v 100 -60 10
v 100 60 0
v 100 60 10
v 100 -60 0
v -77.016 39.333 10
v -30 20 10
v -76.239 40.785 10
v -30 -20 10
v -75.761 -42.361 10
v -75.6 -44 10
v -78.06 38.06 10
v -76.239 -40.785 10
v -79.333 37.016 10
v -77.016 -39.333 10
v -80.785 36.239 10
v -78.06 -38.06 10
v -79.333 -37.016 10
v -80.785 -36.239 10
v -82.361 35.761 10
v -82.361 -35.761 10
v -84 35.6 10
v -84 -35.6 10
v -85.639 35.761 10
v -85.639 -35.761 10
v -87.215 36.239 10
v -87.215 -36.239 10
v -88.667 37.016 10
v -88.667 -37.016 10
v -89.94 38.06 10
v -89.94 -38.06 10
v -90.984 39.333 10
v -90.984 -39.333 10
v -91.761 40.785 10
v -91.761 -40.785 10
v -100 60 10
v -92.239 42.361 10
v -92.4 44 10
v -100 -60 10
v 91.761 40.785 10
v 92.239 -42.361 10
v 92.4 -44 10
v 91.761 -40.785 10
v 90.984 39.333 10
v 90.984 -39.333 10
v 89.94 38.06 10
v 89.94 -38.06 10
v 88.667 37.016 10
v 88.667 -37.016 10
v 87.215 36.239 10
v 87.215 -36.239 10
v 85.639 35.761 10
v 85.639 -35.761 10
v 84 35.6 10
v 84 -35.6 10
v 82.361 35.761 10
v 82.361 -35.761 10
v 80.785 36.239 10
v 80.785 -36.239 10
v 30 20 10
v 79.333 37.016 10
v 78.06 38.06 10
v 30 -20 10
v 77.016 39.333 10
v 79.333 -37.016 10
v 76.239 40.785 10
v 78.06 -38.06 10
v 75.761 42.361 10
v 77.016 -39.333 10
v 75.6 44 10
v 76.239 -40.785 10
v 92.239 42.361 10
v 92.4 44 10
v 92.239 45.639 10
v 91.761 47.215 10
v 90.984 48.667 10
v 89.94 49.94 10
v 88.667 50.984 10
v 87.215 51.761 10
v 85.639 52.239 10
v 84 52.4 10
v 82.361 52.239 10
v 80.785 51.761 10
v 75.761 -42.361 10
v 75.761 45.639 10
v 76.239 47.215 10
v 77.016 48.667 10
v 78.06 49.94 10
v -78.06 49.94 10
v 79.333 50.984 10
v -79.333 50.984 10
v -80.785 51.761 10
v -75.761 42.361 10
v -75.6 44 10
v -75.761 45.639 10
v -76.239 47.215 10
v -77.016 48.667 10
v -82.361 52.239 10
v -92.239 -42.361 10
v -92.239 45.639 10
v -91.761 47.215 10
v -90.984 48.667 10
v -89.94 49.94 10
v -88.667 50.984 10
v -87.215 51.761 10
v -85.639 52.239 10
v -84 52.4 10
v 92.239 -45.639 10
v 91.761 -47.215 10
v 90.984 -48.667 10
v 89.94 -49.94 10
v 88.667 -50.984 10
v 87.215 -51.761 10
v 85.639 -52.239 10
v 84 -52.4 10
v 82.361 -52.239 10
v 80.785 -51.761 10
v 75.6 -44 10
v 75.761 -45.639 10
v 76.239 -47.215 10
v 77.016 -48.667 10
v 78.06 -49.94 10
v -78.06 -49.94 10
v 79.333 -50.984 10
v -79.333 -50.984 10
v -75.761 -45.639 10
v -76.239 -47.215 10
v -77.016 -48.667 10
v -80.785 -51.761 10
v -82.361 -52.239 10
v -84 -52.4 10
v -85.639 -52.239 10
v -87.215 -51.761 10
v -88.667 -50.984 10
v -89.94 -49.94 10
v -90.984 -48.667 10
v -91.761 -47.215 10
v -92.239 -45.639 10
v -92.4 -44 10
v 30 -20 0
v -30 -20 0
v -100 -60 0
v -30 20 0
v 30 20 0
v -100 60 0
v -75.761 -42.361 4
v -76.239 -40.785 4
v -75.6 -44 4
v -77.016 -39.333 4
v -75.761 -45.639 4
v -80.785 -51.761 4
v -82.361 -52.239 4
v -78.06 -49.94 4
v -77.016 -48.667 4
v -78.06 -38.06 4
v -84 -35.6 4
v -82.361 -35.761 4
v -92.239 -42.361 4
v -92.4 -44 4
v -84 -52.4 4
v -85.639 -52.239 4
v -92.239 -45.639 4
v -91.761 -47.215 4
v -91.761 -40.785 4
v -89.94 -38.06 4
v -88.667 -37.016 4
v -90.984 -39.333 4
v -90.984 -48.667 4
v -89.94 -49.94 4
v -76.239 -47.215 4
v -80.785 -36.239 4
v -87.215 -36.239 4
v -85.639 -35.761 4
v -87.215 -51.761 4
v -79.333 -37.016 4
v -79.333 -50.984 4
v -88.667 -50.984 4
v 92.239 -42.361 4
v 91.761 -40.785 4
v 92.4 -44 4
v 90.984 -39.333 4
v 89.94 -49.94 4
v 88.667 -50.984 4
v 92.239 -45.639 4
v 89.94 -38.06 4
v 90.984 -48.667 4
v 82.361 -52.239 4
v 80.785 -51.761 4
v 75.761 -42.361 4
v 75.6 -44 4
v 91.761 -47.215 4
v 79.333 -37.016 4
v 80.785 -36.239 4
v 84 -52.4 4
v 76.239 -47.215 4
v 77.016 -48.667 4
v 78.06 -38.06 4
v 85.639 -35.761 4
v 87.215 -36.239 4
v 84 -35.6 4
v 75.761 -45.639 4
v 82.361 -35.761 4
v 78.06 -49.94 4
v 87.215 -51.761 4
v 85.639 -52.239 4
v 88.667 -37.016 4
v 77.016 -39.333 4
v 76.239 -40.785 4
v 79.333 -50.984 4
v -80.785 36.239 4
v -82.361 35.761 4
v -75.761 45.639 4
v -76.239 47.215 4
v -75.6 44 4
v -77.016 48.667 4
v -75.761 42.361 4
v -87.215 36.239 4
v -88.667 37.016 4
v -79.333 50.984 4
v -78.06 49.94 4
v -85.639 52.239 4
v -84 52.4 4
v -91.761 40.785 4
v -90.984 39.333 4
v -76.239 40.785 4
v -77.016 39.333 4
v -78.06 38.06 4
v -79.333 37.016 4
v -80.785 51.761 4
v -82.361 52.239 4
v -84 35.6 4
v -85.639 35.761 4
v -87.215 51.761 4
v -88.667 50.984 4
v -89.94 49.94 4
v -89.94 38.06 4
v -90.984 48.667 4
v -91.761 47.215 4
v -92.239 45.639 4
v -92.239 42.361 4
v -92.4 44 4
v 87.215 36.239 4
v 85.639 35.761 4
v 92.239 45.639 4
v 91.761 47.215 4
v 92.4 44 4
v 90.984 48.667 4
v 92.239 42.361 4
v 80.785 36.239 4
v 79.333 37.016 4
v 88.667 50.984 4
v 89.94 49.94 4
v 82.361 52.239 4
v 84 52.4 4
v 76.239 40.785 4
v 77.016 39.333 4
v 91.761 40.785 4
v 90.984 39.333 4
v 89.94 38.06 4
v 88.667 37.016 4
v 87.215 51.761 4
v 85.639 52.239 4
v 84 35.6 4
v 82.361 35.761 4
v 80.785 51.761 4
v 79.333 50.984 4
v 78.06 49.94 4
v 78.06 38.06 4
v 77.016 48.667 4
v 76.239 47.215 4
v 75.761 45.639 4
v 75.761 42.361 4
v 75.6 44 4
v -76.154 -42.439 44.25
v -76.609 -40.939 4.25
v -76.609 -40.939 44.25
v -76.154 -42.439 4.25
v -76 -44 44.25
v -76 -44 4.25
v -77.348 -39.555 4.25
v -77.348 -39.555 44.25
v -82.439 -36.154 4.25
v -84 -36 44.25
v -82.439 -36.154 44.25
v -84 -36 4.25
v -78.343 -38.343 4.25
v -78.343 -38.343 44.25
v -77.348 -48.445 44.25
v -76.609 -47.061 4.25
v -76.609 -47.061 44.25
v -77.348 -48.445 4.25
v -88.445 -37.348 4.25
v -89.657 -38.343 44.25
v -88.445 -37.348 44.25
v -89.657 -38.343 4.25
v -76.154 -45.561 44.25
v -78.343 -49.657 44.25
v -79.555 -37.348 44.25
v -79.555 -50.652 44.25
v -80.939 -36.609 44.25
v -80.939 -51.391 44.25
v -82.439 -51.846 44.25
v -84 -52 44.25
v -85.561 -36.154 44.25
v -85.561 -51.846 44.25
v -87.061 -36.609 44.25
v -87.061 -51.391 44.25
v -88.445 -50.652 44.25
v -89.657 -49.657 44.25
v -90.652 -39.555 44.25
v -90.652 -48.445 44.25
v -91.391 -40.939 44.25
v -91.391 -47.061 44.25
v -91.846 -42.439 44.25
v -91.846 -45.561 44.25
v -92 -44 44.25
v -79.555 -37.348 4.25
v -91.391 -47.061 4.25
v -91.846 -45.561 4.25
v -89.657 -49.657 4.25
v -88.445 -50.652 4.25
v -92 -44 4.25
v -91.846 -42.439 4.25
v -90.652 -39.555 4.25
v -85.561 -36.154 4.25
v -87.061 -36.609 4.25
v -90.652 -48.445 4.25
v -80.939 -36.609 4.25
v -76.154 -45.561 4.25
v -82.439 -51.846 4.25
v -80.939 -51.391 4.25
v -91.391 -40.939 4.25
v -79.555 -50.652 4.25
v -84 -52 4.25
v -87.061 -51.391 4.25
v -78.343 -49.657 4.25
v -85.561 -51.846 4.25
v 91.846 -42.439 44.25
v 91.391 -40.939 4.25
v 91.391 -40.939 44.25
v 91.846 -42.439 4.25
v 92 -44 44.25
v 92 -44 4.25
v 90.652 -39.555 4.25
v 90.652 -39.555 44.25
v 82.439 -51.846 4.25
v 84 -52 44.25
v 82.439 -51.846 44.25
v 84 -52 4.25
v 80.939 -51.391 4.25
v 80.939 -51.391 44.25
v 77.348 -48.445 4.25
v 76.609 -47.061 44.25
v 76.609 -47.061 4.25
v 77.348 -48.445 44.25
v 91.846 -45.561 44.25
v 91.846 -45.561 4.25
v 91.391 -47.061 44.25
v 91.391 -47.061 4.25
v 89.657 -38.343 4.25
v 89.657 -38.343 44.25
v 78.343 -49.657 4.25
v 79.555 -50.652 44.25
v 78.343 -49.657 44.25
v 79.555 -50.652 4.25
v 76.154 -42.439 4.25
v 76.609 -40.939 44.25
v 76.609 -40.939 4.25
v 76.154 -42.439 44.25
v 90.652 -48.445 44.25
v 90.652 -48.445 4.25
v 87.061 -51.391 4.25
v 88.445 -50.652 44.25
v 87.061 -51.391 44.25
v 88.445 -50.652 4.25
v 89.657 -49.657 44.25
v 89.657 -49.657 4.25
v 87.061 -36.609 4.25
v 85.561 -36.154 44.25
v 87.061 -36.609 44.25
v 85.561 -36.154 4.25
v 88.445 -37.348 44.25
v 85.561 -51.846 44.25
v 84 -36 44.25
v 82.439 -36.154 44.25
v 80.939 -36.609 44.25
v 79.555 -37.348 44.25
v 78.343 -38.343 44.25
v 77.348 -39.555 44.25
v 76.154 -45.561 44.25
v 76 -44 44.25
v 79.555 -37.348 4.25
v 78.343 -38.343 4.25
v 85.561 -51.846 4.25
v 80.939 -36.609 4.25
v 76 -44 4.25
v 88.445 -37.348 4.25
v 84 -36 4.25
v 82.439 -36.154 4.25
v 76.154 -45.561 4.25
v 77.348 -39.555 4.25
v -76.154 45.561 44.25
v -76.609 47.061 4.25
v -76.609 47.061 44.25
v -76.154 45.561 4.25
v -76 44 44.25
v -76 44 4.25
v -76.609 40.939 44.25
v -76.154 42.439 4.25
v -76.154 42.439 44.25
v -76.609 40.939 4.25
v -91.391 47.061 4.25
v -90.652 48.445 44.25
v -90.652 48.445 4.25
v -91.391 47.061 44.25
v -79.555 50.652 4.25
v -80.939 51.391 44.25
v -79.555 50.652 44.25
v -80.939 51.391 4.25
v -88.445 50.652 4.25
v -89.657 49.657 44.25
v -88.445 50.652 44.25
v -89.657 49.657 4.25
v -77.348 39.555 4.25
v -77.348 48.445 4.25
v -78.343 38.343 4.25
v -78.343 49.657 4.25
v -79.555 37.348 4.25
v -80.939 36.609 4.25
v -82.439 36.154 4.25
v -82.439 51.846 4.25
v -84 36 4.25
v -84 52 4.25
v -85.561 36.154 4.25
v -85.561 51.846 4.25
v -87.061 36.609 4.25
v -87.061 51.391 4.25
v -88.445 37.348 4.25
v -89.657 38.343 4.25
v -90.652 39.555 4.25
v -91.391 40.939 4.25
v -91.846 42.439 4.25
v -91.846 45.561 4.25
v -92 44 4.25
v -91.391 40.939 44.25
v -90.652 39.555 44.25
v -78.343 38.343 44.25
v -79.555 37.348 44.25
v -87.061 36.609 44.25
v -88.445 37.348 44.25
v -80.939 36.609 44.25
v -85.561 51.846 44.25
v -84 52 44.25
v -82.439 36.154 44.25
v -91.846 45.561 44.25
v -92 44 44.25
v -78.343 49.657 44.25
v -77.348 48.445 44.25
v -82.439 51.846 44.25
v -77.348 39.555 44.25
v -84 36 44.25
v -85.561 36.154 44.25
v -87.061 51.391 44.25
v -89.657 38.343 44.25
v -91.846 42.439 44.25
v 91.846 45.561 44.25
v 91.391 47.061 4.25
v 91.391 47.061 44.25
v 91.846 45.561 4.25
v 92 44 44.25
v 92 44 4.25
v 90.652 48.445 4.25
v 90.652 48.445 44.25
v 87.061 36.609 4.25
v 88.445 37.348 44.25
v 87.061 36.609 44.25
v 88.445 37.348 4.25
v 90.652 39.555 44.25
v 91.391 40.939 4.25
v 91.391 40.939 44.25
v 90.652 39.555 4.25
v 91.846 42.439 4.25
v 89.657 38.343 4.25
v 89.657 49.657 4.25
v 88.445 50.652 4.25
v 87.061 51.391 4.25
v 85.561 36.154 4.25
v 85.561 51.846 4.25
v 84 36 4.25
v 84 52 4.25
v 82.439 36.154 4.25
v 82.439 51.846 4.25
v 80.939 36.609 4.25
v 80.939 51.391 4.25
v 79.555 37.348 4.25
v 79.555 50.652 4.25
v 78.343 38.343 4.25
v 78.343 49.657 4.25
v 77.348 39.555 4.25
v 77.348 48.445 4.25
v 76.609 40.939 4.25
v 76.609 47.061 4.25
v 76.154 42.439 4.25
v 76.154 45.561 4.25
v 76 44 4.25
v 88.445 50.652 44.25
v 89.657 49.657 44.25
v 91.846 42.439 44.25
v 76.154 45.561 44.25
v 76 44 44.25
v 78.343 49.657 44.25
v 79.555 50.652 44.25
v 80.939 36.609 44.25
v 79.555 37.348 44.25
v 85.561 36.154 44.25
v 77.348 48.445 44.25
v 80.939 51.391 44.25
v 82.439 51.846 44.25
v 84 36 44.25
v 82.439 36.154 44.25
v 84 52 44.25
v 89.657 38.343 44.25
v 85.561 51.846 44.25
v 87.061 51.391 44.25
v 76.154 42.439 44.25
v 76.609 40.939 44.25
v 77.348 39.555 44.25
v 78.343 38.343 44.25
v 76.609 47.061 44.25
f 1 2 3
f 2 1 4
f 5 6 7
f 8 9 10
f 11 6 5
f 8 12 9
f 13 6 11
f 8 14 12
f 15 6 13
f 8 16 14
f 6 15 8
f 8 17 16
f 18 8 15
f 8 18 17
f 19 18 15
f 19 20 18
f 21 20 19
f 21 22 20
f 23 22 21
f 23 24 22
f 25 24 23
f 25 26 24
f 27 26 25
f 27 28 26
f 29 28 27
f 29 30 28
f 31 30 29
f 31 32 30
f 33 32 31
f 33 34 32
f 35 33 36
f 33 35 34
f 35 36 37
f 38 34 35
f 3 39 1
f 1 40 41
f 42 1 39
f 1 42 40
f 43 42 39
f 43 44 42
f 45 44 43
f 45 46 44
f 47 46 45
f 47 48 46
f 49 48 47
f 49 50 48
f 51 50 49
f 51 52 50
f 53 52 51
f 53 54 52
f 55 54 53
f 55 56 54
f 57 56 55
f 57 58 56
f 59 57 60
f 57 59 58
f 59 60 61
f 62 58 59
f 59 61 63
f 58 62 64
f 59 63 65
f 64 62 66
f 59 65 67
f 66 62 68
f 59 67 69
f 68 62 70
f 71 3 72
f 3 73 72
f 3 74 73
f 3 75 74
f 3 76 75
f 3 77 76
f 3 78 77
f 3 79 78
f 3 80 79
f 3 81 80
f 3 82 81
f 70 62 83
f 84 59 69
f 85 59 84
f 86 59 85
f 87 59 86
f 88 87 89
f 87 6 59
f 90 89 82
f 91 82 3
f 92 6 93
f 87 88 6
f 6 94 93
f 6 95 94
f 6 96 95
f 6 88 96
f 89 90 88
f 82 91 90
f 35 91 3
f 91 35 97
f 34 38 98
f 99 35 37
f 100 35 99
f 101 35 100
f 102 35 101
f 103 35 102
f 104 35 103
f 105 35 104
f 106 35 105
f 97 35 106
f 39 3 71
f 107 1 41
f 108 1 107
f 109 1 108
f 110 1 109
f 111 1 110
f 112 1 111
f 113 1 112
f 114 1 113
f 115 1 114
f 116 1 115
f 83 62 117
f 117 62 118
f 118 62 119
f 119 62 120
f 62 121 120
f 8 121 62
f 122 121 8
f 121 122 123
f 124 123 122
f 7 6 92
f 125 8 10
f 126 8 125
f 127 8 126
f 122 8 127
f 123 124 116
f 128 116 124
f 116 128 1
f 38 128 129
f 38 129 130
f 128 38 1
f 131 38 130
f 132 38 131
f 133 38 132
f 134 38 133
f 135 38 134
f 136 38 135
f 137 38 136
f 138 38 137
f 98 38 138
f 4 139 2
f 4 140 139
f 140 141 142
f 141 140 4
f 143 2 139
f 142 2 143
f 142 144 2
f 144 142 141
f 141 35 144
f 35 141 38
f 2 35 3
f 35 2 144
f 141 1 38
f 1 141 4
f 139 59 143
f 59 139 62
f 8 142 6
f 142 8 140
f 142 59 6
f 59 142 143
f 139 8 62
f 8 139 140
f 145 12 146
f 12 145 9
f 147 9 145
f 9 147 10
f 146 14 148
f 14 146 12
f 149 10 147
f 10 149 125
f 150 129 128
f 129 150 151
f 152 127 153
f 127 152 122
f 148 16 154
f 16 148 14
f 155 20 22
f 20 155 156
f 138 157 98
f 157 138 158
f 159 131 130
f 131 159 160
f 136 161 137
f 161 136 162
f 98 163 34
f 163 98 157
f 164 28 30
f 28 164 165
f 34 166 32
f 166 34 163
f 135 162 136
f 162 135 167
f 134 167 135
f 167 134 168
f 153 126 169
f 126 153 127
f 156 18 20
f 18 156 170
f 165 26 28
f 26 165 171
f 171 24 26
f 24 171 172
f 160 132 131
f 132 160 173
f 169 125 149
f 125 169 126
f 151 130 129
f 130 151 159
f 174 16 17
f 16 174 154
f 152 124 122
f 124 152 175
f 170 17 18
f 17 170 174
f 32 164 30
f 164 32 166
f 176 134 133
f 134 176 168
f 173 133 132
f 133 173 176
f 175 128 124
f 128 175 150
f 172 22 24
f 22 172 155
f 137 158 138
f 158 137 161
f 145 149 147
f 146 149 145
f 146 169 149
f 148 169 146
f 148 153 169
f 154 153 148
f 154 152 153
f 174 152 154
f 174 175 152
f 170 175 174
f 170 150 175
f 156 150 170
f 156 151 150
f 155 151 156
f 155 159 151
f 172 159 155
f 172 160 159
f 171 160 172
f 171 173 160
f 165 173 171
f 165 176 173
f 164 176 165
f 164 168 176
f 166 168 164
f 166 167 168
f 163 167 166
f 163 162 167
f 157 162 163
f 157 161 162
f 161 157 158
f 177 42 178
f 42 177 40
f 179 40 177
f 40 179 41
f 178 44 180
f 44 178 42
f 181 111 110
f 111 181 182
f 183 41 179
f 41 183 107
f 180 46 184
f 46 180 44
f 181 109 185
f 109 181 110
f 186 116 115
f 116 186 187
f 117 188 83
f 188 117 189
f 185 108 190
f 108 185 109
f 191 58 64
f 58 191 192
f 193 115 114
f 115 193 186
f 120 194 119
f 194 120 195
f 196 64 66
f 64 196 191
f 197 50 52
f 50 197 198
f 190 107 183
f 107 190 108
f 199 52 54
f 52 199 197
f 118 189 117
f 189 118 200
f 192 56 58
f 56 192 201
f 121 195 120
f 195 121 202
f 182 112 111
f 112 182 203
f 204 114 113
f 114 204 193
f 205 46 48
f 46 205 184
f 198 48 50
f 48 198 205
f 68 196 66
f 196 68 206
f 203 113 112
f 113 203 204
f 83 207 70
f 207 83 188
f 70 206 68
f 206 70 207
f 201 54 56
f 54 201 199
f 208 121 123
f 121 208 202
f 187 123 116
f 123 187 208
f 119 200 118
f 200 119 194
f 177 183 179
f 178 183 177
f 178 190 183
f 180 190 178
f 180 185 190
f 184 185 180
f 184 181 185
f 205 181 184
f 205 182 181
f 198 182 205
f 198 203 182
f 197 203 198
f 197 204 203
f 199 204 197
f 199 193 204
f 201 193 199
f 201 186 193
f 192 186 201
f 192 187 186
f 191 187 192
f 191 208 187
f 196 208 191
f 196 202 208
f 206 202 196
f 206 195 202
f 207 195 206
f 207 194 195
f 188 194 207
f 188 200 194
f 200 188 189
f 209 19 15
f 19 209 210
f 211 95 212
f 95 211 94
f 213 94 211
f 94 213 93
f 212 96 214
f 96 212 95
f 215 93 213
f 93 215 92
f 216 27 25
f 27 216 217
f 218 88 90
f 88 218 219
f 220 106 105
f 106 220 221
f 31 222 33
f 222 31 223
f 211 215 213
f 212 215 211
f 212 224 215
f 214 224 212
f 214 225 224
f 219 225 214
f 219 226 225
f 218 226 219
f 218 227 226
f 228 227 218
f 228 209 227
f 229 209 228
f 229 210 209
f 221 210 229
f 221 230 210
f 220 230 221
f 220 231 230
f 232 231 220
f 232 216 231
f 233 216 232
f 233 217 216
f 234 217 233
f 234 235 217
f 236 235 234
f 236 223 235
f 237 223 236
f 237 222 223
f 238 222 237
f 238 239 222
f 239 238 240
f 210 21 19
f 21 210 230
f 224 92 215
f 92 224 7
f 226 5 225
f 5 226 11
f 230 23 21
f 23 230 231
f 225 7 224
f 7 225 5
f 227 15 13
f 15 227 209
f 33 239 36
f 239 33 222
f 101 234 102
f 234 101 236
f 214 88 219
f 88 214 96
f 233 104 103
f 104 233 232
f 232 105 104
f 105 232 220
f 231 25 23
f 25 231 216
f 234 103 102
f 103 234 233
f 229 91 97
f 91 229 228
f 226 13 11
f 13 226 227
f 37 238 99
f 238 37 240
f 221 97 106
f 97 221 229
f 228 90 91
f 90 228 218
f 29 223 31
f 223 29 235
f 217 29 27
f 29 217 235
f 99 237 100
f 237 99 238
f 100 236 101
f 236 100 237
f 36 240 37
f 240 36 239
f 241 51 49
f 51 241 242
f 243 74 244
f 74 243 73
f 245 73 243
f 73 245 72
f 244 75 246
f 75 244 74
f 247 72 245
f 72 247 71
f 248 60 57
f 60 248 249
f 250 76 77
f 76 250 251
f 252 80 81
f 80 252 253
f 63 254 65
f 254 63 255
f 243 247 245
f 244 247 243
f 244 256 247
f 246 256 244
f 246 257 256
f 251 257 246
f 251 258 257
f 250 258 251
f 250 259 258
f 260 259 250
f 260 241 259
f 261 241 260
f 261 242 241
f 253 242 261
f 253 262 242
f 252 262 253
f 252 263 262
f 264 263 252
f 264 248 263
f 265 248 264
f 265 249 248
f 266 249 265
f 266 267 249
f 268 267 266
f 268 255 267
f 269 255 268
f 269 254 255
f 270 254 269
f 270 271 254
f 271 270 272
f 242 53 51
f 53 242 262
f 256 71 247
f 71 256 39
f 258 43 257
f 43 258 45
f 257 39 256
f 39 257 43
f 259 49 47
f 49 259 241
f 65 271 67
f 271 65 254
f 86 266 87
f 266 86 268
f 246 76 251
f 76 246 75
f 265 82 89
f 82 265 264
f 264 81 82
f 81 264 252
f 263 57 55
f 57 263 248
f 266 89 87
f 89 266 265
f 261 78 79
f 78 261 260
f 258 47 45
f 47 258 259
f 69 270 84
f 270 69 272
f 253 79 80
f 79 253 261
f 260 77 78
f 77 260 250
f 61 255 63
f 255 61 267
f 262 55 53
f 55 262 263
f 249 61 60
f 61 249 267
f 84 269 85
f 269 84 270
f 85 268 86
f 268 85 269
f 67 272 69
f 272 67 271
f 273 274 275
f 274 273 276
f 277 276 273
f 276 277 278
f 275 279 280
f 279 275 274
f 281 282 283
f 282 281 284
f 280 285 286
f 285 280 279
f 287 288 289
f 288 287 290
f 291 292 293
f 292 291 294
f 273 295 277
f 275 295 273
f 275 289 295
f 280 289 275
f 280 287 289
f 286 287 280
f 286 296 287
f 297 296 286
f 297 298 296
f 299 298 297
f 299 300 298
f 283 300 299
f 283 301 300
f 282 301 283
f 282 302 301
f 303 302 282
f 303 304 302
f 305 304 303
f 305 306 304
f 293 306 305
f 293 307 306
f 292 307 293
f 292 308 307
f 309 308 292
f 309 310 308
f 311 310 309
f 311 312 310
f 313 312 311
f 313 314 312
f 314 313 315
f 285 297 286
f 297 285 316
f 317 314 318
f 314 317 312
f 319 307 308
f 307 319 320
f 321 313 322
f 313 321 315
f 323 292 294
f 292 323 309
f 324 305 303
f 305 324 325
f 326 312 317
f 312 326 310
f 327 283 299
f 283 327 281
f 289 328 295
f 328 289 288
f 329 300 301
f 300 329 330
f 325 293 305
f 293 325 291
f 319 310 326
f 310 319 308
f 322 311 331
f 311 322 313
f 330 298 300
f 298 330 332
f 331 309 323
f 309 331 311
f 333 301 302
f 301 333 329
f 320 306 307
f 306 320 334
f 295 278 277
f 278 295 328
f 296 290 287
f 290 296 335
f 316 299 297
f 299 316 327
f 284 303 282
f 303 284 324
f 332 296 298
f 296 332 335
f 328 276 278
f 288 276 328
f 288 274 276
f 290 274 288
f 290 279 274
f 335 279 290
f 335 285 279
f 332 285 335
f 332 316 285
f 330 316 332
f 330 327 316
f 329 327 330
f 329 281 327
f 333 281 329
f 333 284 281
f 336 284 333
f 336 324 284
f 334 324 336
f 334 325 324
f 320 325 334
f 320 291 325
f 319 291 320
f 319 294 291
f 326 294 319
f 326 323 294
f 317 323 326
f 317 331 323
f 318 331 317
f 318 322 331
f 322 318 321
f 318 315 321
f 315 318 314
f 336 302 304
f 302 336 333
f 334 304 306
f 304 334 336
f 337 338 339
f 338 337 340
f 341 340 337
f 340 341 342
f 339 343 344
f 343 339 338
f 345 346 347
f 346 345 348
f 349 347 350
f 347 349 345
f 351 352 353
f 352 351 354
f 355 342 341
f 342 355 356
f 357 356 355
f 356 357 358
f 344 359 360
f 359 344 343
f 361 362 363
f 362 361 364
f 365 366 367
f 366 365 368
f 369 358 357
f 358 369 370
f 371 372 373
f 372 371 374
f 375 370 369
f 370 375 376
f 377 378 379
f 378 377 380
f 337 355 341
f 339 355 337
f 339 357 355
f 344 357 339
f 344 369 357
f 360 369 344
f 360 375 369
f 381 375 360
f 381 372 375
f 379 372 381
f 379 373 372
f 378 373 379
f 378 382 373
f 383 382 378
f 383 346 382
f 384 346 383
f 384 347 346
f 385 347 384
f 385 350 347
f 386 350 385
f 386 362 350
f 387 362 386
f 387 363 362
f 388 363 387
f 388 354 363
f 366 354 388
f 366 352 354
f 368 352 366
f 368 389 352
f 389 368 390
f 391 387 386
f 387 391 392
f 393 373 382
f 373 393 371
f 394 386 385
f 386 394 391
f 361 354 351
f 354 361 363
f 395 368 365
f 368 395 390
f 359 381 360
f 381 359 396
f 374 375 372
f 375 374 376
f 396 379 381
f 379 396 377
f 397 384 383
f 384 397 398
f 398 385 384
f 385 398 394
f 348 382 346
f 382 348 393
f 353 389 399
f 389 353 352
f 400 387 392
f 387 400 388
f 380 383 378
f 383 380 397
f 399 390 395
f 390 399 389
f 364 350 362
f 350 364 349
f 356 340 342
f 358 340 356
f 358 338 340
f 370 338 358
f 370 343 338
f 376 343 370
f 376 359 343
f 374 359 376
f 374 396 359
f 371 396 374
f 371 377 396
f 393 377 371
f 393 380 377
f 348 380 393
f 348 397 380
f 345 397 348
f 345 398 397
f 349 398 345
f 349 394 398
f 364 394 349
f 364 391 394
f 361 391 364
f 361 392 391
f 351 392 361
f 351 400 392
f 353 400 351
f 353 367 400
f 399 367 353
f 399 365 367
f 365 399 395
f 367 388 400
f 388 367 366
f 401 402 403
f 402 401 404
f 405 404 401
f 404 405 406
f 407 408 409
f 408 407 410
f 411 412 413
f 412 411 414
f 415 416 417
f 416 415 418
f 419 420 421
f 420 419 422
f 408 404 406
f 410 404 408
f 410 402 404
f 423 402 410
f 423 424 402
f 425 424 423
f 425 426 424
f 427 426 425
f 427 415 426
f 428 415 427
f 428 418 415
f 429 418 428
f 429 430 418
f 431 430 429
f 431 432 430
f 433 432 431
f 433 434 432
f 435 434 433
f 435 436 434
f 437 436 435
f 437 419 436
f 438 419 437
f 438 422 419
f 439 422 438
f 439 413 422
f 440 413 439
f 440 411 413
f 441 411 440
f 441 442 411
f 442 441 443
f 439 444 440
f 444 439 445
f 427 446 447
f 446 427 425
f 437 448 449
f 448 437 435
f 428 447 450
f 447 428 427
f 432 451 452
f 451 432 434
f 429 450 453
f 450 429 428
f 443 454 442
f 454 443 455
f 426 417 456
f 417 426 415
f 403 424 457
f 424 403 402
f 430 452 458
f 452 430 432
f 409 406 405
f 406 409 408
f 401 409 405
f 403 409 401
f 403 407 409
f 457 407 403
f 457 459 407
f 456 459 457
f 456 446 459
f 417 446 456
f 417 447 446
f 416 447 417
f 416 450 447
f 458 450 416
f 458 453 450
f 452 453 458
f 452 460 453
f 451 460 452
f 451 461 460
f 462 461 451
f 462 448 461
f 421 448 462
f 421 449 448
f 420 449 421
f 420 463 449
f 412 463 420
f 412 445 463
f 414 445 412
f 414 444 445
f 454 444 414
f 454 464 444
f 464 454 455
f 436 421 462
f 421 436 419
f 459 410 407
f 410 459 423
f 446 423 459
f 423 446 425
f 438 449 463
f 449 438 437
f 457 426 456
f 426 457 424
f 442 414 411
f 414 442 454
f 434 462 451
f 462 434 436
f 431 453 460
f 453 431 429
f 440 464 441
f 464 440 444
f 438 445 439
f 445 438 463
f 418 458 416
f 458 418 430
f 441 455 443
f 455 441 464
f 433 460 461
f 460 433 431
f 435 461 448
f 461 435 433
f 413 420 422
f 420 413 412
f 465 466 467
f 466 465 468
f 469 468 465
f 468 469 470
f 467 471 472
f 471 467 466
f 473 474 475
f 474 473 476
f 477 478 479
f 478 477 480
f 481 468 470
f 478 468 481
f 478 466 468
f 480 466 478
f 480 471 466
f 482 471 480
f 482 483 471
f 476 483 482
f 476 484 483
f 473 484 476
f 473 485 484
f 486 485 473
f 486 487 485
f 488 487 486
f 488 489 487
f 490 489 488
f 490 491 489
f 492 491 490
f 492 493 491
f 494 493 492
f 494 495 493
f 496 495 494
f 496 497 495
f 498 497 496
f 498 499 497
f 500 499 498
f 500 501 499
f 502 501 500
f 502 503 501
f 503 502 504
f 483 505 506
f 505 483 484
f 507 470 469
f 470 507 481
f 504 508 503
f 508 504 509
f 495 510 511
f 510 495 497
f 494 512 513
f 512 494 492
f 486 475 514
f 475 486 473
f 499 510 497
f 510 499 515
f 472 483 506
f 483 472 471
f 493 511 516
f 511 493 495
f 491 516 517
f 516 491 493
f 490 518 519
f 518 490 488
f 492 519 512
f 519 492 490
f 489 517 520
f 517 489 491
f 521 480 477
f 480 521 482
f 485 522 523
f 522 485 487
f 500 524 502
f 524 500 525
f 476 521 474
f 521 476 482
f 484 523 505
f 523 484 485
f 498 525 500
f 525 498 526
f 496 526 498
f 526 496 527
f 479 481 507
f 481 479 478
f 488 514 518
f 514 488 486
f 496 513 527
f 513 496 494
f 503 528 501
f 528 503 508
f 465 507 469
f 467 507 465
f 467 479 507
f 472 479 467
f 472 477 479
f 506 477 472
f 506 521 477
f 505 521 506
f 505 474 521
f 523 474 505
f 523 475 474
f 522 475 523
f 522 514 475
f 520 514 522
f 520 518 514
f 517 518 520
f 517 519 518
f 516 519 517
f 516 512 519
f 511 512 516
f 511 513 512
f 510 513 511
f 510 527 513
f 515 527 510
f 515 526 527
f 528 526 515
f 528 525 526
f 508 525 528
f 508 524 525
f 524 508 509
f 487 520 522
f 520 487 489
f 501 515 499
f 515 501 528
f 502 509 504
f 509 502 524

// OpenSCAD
$fn = 32;

// ------------------------------------------------------------------------
// Frame with four posts: 200 x 120 mm frame, four d16 posts
// Every part is its own module, assembly() places them once.
// ------------------------------------------------------------------------

// --- part 1 ---
module base_frame() {
  difference() {
    translate([-100, -60, 0]) cube([200, 120, 10]);
    translate([-30, -20, -1]) cube([60, 40, 12]);
    translate([-84, -44, 4]) cylinder(h = 7, d = 16.8);
    translate([84, -44, 4]) cylinder(h = 7, d = 16.8);
    translate([-84, 44, 4]) cylinder(h = 7, d = 16.8);
    translate([84, 44, 4]) cylinder(h = 7, d = 16.8);
  }
}

// --- part 2 ---
module post1() {
  cylinder(h = 40, d = 16);
}

// --- part 3 ---
module post2() {
  cylinder(h = 40, d = 16);
}

// --- part 4 ---
module post3() {
  cylinder(h = 40, d = 16);
}

// --- part 5 ---
module post4() {
  cylinder(h = 40, d = 16);
}

// --- assembly ---
module assembly() {
  translate([0, 0, 0]) rotate([0, 0, 0]) base_frame();
  translate([-84, -44, 4.25]) rotate([0, 0, 0]) post1();
  translate([84, -44, 4.25]) rotate([0, 0, 0]) post2();
  translate([-84, 44, 4.25]) rotate([0, 0, 0]) post3();
  translate([84, 44, 4.25]) rotate([0, 0, 0]) post4();
}

assembly();
